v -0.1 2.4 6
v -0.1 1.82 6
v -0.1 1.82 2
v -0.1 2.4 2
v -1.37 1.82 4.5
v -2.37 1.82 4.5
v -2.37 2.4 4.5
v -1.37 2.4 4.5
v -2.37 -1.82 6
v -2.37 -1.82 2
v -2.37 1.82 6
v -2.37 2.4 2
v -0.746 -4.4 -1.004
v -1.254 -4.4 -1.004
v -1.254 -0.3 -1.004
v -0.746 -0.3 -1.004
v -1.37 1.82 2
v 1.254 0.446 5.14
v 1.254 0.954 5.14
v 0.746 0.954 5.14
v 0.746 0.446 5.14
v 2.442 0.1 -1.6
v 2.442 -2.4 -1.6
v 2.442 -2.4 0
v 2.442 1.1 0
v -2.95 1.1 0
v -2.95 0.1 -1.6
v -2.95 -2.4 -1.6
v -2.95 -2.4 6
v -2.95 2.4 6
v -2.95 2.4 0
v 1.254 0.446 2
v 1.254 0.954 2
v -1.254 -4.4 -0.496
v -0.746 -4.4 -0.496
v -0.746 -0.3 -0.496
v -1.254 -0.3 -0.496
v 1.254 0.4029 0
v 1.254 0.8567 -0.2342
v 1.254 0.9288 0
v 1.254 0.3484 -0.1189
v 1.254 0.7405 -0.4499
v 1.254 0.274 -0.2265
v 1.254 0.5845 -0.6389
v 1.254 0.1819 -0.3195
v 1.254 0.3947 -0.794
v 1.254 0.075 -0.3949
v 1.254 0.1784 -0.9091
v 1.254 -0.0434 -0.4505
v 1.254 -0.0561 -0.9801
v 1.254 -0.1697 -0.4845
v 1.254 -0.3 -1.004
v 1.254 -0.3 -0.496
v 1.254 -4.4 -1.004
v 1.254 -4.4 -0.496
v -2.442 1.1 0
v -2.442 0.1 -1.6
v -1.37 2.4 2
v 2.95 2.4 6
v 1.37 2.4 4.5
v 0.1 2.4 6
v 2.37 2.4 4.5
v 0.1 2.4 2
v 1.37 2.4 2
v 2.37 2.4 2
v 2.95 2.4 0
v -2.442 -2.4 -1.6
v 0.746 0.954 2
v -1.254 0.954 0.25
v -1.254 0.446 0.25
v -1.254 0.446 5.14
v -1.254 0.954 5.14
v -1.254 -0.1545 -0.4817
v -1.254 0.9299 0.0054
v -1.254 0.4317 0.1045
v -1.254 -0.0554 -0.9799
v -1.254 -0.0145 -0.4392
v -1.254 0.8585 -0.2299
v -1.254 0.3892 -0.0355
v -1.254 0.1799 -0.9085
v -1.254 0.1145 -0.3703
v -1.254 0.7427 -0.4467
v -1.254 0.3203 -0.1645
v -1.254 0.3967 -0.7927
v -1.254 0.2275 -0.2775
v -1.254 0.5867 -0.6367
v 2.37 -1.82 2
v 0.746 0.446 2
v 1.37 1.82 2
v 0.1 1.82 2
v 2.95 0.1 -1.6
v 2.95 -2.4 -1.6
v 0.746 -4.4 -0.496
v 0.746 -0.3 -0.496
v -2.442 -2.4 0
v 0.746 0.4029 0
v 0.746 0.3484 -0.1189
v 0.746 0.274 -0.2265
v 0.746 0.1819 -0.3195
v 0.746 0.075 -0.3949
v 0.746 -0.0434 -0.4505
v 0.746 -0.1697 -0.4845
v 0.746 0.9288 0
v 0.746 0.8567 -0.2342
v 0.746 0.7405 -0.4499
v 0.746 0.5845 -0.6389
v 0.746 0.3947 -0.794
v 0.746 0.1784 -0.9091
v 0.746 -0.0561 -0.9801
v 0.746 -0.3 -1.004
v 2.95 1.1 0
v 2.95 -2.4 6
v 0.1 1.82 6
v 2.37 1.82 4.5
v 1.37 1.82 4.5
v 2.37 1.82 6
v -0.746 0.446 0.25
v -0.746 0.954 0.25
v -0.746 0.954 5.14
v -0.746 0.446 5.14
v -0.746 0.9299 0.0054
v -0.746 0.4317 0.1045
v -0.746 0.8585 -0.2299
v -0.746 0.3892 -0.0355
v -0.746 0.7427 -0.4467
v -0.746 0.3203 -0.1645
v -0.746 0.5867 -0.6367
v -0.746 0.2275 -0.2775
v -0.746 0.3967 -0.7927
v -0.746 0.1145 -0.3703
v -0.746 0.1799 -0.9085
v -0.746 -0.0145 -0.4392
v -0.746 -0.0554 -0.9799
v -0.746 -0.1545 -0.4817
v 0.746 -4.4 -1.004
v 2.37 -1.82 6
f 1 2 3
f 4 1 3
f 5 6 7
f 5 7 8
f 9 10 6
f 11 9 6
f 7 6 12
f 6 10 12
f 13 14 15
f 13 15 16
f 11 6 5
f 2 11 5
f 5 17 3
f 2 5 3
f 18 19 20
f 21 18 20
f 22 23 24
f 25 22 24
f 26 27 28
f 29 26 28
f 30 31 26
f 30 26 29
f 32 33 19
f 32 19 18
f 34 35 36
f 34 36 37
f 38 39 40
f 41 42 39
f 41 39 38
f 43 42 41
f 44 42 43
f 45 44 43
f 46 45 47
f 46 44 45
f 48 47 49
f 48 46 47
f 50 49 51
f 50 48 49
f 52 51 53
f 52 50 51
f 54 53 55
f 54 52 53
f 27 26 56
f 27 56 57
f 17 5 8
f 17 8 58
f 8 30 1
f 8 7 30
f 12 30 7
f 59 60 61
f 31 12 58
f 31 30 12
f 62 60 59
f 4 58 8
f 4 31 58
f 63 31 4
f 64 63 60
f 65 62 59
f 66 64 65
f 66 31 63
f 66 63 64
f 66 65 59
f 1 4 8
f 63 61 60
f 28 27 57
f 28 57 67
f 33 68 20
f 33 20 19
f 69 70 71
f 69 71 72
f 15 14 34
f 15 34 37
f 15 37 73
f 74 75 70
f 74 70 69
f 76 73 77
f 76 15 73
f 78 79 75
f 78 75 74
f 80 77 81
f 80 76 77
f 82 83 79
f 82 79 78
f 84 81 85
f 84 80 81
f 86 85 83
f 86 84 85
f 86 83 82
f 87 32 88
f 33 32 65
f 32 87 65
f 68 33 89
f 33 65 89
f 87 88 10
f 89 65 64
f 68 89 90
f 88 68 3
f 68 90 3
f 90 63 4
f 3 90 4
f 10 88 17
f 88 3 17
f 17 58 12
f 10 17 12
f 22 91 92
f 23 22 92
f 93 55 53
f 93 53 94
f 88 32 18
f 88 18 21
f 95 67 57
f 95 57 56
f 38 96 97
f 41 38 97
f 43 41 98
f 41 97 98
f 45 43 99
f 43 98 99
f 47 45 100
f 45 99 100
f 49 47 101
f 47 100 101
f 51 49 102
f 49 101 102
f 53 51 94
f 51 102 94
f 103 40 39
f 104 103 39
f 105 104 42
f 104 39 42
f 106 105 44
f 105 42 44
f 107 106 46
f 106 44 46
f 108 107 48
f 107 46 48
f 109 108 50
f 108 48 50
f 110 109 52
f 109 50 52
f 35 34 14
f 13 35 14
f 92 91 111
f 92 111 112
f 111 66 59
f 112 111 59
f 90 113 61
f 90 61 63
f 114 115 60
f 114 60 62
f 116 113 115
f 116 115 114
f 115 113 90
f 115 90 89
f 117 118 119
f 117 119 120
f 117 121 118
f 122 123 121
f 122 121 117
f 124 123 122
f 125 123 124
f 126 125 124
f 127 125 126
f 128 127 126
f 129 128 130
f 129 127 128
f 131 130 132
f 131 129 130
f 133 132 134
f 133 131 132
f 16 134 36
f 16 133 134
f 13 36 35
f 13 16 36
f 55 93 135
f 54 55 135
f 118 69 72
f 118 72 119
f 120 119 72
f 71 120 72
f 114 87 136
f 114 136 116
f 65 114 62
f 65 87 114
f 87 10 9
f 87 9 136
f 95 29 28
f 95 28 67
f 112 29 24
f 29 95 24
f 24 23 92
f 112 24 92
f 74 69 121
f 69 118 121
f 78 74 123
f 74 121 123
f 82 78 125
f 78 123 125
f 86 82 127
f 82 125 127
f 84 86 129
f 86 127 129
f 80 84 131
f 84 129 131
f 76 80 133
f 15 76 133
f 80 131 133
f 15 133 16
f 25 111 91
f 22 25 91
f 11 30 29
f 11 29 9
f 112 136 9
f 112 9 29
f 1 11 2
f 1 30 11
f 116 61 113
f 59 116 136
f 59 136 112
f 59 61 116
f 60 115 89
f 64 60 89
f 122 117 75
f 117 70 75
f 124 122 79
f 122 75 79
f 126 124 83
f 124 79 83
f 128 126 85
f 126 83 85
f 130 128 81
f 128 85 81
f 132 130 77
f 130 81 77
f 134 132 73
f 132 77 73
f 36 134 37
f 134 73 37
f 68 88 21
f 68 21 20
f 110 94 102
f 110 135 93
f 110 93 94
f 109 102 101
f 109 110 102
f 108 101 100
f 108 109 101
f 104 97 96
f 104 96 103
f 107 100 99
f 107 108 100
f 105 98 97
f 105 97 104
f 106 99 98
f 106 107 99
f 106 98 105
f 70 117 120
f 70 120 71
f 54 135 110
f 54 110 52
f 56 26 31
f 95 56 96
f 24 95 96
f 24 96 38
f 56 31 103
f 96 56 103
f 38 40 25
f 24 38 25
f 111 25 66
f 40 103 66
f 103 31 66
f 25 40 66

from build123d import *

# Parameters (mm, degrees)
SKETCH4_W                      = 5.9
SKETCH4_H                      = 4.8
BODY_EXTRUDE2_DEPTH            = 6
BODY_SHELL1_T                  = -0.58
BODY_SHELL1_THICKNESS_2_FACE_W = 4.74
BODY_SHELL1_THICKNESS_2_FACE_H = 3.64
BODY_SHELL1_THICKNESS_2_DEPTH  = 1.42
EXTRUDE1_REACH                 = 9.906
SKETCH66_W                     = 0.2
SKETCH66_H                     = 4
SKETCH66_W_2                   = 1
SKETCH66_H_2                   = 2.5
TAB_EXTRUDE4_DEPTH             = 0.508
TAB_EXTRUDE7_DEPTH             = 0.508
SKETCH64_W                     = 0.508
SKETCH64_H                     = 0.508
PINS_LPATTERN_COUNT            = 2
PINS_LPATTERN_PITCH            = 2


with BuildPart() as part:
    # Sketch4 → Body-Extrude2 (new body)
    with BuildSketch(Plane(origin=(6.86422654, -1.863703399, 0), x_dir=(1, 0, 0), z_dir=(0, 0, 1))):
        with Locations((-6.86422654, 1.863703399)):
            Rectangle(SKETCH4_W, SKETCH4_H)
    extrude(amount=BODY_EXTRUDE2_DEPTH)

    # Body-Shell1
    body_shell1_openings = [part.faces().sort_by_distance(p)[0] for p in [
        (0, 0, 6),
    ]]
    offset(amount=BODY_SHELL1_T, openings=body_shell1_openings, kind=Kind.INTERSECTION)

    # Body-Shell1 thickness 2 face (on inner face of the shell) → Body-Shell1 thickness 2 (add)
    with BuildSketch(Plane(origin=(0, 0, 0.58), x_dir=(-1, 0, 0), z_dir=(0, 0, -1))):
        Rectangle(BODY_SHELL1_THICKNESS_2_FACE_W, BODY_SHELL1_THICKNESS_2_FACE_H)
    extrude(amount=-BODY_SHELL1_THICKNESS_2_DEPTH)

    # Sketch66 → Extrude1 (cut, up to next)
    with BuildSketch(Plane(origin=(0, 1.82, 0), x_dir=(1, 0, 0), z_dir=(0, 1, 0)), mode=Mode.PRIVATE) as extrude1_sk1:
        with Locations((0, -4)):
            Rectangle(SKETCH66_W, SKETCH66_H)
    extrude1_tool1 = extrude(extrude1_sk1.sketch, amount=EXTRUDE1_REACH, mode=Mode.PRIVATE) & part.part
    # Sketch66 → Extrude1 (cut, up to next)
    with BuildSketch(Plane(origin=(0, 1.82, 0), x_dir=(1, 0, 0), z_dir=(0, 1, 0)), mode=Mode.PRIVATE) as extrude1_sk2:
        with Locations((-1.87, -3.25)):
            Rectangle(SKETCH66_W_2, SKETCH66_H_2)
    extrude1_tool2 = extrude(extrude1_sk2.sketch, amount=EXTRUDE1_REACH, mode=Mode.PRIVATE) & part.part
    # Sketch66 → Extrude1 (cut, up to next)
    with BuildSketch(Plane(origin=(0, 1.82, 0), x_dir=(1, 0, 0), z_dir=(0, 1, 0)), mode=Mode.PRIVATE) as extrude1_sk3:
        with Locations((1.87, -3.25)):
            Rectangle(SKETCH66_W_2, SKETCH66_H_2)
    extrude1_tool3 = extrude(extrude1_sk3.sketch, amount=EXTRUDE1_REACH, mode=Mode.PRIVATE) & part.part
    add(extrude1_tool1.solids().sort_by_distance((0, 1.82, 4))[0], mode=Mode.SUBTRACT)
    add(extrude1_tool2.solids().sort_by_distance((-1.87, 1.82, 3.25))[0], mode=Mode.SUBTRACT)
    add(extrude1_tool3.solids().sort_by_distance((1.87, 1.82, 3.25))[0], mode=Mode.SUBTRACT)

    # Sketch6 → Tab-Extrude4 (add)
    with BuildSketch(Plane(origin=(2.95, 11.117293973, 0), x_dir=(0, 0, -1), z_dir=(1, 0, 0))):
        Polygon((0, -10.017293973), (1.6, -11.017293973), (1.6, -13.517293973), (0, -13.517293973), align=None)
    extrude(amount=-TAB_EXTRUDE4_DEPTH)

    # Sketch9 → Tab-Extrude7 (add)
    with BuildSketch(Plane(origin=(-2.95, 11.117293973, 0), x_dir=(0, 0, 1), z_dir=(-1, 0, 0))):
        Polygon((0, -13.517293973), (0, -10.017293973), (-1.6, -11.017293973), (-1.6, -13.517293973), align=None)
    extrude(amount=-TAB_EXTRUDE7_DEPTH)


with BuildPart() as body_2:
    # Pins-Sweep: sweep along a path in Sketch65
    with BuildLine(Plane(origin=(0, 0, 0), x_dir=(0, 0, -1), z_dir=(1, 0, 0))) as pins_sweep_path:
        Line((-5.14, 0.7), (-0.25, 0.7))
        ThreePointArc((-0.25, 0.7), (0.457106781, 0.407106781), (0.75, -0.3))
        Line((0.75, -0.3), (0.75, -4.4))
    # Sketch64 → Pins-Sweep (sweep)
    with BuildSketch(Plane(origin=(0, 3.64, 5.14), x_dir=(1, 0, 0), z_dir=(0, 0, -1))):
        with Locations((-1, 2.94)):
            Rectangle(SKETCH64_W, SKETCH64_H)
    pins_sweep = sweep(path=pins_sweep_path.line)


with BuildPart() as part_1:
    add(part.part)

    # Pins-LPattern: Pins-Sweep ×2
    with Locations(*[(i * PINS_LPATTERN_PITCH, 0, 0) for i in range(1, PINS_LPATTERN_COUNT)]):
        add(pins_sweep)


solid = Compound([body_2.part, part_1.part])
